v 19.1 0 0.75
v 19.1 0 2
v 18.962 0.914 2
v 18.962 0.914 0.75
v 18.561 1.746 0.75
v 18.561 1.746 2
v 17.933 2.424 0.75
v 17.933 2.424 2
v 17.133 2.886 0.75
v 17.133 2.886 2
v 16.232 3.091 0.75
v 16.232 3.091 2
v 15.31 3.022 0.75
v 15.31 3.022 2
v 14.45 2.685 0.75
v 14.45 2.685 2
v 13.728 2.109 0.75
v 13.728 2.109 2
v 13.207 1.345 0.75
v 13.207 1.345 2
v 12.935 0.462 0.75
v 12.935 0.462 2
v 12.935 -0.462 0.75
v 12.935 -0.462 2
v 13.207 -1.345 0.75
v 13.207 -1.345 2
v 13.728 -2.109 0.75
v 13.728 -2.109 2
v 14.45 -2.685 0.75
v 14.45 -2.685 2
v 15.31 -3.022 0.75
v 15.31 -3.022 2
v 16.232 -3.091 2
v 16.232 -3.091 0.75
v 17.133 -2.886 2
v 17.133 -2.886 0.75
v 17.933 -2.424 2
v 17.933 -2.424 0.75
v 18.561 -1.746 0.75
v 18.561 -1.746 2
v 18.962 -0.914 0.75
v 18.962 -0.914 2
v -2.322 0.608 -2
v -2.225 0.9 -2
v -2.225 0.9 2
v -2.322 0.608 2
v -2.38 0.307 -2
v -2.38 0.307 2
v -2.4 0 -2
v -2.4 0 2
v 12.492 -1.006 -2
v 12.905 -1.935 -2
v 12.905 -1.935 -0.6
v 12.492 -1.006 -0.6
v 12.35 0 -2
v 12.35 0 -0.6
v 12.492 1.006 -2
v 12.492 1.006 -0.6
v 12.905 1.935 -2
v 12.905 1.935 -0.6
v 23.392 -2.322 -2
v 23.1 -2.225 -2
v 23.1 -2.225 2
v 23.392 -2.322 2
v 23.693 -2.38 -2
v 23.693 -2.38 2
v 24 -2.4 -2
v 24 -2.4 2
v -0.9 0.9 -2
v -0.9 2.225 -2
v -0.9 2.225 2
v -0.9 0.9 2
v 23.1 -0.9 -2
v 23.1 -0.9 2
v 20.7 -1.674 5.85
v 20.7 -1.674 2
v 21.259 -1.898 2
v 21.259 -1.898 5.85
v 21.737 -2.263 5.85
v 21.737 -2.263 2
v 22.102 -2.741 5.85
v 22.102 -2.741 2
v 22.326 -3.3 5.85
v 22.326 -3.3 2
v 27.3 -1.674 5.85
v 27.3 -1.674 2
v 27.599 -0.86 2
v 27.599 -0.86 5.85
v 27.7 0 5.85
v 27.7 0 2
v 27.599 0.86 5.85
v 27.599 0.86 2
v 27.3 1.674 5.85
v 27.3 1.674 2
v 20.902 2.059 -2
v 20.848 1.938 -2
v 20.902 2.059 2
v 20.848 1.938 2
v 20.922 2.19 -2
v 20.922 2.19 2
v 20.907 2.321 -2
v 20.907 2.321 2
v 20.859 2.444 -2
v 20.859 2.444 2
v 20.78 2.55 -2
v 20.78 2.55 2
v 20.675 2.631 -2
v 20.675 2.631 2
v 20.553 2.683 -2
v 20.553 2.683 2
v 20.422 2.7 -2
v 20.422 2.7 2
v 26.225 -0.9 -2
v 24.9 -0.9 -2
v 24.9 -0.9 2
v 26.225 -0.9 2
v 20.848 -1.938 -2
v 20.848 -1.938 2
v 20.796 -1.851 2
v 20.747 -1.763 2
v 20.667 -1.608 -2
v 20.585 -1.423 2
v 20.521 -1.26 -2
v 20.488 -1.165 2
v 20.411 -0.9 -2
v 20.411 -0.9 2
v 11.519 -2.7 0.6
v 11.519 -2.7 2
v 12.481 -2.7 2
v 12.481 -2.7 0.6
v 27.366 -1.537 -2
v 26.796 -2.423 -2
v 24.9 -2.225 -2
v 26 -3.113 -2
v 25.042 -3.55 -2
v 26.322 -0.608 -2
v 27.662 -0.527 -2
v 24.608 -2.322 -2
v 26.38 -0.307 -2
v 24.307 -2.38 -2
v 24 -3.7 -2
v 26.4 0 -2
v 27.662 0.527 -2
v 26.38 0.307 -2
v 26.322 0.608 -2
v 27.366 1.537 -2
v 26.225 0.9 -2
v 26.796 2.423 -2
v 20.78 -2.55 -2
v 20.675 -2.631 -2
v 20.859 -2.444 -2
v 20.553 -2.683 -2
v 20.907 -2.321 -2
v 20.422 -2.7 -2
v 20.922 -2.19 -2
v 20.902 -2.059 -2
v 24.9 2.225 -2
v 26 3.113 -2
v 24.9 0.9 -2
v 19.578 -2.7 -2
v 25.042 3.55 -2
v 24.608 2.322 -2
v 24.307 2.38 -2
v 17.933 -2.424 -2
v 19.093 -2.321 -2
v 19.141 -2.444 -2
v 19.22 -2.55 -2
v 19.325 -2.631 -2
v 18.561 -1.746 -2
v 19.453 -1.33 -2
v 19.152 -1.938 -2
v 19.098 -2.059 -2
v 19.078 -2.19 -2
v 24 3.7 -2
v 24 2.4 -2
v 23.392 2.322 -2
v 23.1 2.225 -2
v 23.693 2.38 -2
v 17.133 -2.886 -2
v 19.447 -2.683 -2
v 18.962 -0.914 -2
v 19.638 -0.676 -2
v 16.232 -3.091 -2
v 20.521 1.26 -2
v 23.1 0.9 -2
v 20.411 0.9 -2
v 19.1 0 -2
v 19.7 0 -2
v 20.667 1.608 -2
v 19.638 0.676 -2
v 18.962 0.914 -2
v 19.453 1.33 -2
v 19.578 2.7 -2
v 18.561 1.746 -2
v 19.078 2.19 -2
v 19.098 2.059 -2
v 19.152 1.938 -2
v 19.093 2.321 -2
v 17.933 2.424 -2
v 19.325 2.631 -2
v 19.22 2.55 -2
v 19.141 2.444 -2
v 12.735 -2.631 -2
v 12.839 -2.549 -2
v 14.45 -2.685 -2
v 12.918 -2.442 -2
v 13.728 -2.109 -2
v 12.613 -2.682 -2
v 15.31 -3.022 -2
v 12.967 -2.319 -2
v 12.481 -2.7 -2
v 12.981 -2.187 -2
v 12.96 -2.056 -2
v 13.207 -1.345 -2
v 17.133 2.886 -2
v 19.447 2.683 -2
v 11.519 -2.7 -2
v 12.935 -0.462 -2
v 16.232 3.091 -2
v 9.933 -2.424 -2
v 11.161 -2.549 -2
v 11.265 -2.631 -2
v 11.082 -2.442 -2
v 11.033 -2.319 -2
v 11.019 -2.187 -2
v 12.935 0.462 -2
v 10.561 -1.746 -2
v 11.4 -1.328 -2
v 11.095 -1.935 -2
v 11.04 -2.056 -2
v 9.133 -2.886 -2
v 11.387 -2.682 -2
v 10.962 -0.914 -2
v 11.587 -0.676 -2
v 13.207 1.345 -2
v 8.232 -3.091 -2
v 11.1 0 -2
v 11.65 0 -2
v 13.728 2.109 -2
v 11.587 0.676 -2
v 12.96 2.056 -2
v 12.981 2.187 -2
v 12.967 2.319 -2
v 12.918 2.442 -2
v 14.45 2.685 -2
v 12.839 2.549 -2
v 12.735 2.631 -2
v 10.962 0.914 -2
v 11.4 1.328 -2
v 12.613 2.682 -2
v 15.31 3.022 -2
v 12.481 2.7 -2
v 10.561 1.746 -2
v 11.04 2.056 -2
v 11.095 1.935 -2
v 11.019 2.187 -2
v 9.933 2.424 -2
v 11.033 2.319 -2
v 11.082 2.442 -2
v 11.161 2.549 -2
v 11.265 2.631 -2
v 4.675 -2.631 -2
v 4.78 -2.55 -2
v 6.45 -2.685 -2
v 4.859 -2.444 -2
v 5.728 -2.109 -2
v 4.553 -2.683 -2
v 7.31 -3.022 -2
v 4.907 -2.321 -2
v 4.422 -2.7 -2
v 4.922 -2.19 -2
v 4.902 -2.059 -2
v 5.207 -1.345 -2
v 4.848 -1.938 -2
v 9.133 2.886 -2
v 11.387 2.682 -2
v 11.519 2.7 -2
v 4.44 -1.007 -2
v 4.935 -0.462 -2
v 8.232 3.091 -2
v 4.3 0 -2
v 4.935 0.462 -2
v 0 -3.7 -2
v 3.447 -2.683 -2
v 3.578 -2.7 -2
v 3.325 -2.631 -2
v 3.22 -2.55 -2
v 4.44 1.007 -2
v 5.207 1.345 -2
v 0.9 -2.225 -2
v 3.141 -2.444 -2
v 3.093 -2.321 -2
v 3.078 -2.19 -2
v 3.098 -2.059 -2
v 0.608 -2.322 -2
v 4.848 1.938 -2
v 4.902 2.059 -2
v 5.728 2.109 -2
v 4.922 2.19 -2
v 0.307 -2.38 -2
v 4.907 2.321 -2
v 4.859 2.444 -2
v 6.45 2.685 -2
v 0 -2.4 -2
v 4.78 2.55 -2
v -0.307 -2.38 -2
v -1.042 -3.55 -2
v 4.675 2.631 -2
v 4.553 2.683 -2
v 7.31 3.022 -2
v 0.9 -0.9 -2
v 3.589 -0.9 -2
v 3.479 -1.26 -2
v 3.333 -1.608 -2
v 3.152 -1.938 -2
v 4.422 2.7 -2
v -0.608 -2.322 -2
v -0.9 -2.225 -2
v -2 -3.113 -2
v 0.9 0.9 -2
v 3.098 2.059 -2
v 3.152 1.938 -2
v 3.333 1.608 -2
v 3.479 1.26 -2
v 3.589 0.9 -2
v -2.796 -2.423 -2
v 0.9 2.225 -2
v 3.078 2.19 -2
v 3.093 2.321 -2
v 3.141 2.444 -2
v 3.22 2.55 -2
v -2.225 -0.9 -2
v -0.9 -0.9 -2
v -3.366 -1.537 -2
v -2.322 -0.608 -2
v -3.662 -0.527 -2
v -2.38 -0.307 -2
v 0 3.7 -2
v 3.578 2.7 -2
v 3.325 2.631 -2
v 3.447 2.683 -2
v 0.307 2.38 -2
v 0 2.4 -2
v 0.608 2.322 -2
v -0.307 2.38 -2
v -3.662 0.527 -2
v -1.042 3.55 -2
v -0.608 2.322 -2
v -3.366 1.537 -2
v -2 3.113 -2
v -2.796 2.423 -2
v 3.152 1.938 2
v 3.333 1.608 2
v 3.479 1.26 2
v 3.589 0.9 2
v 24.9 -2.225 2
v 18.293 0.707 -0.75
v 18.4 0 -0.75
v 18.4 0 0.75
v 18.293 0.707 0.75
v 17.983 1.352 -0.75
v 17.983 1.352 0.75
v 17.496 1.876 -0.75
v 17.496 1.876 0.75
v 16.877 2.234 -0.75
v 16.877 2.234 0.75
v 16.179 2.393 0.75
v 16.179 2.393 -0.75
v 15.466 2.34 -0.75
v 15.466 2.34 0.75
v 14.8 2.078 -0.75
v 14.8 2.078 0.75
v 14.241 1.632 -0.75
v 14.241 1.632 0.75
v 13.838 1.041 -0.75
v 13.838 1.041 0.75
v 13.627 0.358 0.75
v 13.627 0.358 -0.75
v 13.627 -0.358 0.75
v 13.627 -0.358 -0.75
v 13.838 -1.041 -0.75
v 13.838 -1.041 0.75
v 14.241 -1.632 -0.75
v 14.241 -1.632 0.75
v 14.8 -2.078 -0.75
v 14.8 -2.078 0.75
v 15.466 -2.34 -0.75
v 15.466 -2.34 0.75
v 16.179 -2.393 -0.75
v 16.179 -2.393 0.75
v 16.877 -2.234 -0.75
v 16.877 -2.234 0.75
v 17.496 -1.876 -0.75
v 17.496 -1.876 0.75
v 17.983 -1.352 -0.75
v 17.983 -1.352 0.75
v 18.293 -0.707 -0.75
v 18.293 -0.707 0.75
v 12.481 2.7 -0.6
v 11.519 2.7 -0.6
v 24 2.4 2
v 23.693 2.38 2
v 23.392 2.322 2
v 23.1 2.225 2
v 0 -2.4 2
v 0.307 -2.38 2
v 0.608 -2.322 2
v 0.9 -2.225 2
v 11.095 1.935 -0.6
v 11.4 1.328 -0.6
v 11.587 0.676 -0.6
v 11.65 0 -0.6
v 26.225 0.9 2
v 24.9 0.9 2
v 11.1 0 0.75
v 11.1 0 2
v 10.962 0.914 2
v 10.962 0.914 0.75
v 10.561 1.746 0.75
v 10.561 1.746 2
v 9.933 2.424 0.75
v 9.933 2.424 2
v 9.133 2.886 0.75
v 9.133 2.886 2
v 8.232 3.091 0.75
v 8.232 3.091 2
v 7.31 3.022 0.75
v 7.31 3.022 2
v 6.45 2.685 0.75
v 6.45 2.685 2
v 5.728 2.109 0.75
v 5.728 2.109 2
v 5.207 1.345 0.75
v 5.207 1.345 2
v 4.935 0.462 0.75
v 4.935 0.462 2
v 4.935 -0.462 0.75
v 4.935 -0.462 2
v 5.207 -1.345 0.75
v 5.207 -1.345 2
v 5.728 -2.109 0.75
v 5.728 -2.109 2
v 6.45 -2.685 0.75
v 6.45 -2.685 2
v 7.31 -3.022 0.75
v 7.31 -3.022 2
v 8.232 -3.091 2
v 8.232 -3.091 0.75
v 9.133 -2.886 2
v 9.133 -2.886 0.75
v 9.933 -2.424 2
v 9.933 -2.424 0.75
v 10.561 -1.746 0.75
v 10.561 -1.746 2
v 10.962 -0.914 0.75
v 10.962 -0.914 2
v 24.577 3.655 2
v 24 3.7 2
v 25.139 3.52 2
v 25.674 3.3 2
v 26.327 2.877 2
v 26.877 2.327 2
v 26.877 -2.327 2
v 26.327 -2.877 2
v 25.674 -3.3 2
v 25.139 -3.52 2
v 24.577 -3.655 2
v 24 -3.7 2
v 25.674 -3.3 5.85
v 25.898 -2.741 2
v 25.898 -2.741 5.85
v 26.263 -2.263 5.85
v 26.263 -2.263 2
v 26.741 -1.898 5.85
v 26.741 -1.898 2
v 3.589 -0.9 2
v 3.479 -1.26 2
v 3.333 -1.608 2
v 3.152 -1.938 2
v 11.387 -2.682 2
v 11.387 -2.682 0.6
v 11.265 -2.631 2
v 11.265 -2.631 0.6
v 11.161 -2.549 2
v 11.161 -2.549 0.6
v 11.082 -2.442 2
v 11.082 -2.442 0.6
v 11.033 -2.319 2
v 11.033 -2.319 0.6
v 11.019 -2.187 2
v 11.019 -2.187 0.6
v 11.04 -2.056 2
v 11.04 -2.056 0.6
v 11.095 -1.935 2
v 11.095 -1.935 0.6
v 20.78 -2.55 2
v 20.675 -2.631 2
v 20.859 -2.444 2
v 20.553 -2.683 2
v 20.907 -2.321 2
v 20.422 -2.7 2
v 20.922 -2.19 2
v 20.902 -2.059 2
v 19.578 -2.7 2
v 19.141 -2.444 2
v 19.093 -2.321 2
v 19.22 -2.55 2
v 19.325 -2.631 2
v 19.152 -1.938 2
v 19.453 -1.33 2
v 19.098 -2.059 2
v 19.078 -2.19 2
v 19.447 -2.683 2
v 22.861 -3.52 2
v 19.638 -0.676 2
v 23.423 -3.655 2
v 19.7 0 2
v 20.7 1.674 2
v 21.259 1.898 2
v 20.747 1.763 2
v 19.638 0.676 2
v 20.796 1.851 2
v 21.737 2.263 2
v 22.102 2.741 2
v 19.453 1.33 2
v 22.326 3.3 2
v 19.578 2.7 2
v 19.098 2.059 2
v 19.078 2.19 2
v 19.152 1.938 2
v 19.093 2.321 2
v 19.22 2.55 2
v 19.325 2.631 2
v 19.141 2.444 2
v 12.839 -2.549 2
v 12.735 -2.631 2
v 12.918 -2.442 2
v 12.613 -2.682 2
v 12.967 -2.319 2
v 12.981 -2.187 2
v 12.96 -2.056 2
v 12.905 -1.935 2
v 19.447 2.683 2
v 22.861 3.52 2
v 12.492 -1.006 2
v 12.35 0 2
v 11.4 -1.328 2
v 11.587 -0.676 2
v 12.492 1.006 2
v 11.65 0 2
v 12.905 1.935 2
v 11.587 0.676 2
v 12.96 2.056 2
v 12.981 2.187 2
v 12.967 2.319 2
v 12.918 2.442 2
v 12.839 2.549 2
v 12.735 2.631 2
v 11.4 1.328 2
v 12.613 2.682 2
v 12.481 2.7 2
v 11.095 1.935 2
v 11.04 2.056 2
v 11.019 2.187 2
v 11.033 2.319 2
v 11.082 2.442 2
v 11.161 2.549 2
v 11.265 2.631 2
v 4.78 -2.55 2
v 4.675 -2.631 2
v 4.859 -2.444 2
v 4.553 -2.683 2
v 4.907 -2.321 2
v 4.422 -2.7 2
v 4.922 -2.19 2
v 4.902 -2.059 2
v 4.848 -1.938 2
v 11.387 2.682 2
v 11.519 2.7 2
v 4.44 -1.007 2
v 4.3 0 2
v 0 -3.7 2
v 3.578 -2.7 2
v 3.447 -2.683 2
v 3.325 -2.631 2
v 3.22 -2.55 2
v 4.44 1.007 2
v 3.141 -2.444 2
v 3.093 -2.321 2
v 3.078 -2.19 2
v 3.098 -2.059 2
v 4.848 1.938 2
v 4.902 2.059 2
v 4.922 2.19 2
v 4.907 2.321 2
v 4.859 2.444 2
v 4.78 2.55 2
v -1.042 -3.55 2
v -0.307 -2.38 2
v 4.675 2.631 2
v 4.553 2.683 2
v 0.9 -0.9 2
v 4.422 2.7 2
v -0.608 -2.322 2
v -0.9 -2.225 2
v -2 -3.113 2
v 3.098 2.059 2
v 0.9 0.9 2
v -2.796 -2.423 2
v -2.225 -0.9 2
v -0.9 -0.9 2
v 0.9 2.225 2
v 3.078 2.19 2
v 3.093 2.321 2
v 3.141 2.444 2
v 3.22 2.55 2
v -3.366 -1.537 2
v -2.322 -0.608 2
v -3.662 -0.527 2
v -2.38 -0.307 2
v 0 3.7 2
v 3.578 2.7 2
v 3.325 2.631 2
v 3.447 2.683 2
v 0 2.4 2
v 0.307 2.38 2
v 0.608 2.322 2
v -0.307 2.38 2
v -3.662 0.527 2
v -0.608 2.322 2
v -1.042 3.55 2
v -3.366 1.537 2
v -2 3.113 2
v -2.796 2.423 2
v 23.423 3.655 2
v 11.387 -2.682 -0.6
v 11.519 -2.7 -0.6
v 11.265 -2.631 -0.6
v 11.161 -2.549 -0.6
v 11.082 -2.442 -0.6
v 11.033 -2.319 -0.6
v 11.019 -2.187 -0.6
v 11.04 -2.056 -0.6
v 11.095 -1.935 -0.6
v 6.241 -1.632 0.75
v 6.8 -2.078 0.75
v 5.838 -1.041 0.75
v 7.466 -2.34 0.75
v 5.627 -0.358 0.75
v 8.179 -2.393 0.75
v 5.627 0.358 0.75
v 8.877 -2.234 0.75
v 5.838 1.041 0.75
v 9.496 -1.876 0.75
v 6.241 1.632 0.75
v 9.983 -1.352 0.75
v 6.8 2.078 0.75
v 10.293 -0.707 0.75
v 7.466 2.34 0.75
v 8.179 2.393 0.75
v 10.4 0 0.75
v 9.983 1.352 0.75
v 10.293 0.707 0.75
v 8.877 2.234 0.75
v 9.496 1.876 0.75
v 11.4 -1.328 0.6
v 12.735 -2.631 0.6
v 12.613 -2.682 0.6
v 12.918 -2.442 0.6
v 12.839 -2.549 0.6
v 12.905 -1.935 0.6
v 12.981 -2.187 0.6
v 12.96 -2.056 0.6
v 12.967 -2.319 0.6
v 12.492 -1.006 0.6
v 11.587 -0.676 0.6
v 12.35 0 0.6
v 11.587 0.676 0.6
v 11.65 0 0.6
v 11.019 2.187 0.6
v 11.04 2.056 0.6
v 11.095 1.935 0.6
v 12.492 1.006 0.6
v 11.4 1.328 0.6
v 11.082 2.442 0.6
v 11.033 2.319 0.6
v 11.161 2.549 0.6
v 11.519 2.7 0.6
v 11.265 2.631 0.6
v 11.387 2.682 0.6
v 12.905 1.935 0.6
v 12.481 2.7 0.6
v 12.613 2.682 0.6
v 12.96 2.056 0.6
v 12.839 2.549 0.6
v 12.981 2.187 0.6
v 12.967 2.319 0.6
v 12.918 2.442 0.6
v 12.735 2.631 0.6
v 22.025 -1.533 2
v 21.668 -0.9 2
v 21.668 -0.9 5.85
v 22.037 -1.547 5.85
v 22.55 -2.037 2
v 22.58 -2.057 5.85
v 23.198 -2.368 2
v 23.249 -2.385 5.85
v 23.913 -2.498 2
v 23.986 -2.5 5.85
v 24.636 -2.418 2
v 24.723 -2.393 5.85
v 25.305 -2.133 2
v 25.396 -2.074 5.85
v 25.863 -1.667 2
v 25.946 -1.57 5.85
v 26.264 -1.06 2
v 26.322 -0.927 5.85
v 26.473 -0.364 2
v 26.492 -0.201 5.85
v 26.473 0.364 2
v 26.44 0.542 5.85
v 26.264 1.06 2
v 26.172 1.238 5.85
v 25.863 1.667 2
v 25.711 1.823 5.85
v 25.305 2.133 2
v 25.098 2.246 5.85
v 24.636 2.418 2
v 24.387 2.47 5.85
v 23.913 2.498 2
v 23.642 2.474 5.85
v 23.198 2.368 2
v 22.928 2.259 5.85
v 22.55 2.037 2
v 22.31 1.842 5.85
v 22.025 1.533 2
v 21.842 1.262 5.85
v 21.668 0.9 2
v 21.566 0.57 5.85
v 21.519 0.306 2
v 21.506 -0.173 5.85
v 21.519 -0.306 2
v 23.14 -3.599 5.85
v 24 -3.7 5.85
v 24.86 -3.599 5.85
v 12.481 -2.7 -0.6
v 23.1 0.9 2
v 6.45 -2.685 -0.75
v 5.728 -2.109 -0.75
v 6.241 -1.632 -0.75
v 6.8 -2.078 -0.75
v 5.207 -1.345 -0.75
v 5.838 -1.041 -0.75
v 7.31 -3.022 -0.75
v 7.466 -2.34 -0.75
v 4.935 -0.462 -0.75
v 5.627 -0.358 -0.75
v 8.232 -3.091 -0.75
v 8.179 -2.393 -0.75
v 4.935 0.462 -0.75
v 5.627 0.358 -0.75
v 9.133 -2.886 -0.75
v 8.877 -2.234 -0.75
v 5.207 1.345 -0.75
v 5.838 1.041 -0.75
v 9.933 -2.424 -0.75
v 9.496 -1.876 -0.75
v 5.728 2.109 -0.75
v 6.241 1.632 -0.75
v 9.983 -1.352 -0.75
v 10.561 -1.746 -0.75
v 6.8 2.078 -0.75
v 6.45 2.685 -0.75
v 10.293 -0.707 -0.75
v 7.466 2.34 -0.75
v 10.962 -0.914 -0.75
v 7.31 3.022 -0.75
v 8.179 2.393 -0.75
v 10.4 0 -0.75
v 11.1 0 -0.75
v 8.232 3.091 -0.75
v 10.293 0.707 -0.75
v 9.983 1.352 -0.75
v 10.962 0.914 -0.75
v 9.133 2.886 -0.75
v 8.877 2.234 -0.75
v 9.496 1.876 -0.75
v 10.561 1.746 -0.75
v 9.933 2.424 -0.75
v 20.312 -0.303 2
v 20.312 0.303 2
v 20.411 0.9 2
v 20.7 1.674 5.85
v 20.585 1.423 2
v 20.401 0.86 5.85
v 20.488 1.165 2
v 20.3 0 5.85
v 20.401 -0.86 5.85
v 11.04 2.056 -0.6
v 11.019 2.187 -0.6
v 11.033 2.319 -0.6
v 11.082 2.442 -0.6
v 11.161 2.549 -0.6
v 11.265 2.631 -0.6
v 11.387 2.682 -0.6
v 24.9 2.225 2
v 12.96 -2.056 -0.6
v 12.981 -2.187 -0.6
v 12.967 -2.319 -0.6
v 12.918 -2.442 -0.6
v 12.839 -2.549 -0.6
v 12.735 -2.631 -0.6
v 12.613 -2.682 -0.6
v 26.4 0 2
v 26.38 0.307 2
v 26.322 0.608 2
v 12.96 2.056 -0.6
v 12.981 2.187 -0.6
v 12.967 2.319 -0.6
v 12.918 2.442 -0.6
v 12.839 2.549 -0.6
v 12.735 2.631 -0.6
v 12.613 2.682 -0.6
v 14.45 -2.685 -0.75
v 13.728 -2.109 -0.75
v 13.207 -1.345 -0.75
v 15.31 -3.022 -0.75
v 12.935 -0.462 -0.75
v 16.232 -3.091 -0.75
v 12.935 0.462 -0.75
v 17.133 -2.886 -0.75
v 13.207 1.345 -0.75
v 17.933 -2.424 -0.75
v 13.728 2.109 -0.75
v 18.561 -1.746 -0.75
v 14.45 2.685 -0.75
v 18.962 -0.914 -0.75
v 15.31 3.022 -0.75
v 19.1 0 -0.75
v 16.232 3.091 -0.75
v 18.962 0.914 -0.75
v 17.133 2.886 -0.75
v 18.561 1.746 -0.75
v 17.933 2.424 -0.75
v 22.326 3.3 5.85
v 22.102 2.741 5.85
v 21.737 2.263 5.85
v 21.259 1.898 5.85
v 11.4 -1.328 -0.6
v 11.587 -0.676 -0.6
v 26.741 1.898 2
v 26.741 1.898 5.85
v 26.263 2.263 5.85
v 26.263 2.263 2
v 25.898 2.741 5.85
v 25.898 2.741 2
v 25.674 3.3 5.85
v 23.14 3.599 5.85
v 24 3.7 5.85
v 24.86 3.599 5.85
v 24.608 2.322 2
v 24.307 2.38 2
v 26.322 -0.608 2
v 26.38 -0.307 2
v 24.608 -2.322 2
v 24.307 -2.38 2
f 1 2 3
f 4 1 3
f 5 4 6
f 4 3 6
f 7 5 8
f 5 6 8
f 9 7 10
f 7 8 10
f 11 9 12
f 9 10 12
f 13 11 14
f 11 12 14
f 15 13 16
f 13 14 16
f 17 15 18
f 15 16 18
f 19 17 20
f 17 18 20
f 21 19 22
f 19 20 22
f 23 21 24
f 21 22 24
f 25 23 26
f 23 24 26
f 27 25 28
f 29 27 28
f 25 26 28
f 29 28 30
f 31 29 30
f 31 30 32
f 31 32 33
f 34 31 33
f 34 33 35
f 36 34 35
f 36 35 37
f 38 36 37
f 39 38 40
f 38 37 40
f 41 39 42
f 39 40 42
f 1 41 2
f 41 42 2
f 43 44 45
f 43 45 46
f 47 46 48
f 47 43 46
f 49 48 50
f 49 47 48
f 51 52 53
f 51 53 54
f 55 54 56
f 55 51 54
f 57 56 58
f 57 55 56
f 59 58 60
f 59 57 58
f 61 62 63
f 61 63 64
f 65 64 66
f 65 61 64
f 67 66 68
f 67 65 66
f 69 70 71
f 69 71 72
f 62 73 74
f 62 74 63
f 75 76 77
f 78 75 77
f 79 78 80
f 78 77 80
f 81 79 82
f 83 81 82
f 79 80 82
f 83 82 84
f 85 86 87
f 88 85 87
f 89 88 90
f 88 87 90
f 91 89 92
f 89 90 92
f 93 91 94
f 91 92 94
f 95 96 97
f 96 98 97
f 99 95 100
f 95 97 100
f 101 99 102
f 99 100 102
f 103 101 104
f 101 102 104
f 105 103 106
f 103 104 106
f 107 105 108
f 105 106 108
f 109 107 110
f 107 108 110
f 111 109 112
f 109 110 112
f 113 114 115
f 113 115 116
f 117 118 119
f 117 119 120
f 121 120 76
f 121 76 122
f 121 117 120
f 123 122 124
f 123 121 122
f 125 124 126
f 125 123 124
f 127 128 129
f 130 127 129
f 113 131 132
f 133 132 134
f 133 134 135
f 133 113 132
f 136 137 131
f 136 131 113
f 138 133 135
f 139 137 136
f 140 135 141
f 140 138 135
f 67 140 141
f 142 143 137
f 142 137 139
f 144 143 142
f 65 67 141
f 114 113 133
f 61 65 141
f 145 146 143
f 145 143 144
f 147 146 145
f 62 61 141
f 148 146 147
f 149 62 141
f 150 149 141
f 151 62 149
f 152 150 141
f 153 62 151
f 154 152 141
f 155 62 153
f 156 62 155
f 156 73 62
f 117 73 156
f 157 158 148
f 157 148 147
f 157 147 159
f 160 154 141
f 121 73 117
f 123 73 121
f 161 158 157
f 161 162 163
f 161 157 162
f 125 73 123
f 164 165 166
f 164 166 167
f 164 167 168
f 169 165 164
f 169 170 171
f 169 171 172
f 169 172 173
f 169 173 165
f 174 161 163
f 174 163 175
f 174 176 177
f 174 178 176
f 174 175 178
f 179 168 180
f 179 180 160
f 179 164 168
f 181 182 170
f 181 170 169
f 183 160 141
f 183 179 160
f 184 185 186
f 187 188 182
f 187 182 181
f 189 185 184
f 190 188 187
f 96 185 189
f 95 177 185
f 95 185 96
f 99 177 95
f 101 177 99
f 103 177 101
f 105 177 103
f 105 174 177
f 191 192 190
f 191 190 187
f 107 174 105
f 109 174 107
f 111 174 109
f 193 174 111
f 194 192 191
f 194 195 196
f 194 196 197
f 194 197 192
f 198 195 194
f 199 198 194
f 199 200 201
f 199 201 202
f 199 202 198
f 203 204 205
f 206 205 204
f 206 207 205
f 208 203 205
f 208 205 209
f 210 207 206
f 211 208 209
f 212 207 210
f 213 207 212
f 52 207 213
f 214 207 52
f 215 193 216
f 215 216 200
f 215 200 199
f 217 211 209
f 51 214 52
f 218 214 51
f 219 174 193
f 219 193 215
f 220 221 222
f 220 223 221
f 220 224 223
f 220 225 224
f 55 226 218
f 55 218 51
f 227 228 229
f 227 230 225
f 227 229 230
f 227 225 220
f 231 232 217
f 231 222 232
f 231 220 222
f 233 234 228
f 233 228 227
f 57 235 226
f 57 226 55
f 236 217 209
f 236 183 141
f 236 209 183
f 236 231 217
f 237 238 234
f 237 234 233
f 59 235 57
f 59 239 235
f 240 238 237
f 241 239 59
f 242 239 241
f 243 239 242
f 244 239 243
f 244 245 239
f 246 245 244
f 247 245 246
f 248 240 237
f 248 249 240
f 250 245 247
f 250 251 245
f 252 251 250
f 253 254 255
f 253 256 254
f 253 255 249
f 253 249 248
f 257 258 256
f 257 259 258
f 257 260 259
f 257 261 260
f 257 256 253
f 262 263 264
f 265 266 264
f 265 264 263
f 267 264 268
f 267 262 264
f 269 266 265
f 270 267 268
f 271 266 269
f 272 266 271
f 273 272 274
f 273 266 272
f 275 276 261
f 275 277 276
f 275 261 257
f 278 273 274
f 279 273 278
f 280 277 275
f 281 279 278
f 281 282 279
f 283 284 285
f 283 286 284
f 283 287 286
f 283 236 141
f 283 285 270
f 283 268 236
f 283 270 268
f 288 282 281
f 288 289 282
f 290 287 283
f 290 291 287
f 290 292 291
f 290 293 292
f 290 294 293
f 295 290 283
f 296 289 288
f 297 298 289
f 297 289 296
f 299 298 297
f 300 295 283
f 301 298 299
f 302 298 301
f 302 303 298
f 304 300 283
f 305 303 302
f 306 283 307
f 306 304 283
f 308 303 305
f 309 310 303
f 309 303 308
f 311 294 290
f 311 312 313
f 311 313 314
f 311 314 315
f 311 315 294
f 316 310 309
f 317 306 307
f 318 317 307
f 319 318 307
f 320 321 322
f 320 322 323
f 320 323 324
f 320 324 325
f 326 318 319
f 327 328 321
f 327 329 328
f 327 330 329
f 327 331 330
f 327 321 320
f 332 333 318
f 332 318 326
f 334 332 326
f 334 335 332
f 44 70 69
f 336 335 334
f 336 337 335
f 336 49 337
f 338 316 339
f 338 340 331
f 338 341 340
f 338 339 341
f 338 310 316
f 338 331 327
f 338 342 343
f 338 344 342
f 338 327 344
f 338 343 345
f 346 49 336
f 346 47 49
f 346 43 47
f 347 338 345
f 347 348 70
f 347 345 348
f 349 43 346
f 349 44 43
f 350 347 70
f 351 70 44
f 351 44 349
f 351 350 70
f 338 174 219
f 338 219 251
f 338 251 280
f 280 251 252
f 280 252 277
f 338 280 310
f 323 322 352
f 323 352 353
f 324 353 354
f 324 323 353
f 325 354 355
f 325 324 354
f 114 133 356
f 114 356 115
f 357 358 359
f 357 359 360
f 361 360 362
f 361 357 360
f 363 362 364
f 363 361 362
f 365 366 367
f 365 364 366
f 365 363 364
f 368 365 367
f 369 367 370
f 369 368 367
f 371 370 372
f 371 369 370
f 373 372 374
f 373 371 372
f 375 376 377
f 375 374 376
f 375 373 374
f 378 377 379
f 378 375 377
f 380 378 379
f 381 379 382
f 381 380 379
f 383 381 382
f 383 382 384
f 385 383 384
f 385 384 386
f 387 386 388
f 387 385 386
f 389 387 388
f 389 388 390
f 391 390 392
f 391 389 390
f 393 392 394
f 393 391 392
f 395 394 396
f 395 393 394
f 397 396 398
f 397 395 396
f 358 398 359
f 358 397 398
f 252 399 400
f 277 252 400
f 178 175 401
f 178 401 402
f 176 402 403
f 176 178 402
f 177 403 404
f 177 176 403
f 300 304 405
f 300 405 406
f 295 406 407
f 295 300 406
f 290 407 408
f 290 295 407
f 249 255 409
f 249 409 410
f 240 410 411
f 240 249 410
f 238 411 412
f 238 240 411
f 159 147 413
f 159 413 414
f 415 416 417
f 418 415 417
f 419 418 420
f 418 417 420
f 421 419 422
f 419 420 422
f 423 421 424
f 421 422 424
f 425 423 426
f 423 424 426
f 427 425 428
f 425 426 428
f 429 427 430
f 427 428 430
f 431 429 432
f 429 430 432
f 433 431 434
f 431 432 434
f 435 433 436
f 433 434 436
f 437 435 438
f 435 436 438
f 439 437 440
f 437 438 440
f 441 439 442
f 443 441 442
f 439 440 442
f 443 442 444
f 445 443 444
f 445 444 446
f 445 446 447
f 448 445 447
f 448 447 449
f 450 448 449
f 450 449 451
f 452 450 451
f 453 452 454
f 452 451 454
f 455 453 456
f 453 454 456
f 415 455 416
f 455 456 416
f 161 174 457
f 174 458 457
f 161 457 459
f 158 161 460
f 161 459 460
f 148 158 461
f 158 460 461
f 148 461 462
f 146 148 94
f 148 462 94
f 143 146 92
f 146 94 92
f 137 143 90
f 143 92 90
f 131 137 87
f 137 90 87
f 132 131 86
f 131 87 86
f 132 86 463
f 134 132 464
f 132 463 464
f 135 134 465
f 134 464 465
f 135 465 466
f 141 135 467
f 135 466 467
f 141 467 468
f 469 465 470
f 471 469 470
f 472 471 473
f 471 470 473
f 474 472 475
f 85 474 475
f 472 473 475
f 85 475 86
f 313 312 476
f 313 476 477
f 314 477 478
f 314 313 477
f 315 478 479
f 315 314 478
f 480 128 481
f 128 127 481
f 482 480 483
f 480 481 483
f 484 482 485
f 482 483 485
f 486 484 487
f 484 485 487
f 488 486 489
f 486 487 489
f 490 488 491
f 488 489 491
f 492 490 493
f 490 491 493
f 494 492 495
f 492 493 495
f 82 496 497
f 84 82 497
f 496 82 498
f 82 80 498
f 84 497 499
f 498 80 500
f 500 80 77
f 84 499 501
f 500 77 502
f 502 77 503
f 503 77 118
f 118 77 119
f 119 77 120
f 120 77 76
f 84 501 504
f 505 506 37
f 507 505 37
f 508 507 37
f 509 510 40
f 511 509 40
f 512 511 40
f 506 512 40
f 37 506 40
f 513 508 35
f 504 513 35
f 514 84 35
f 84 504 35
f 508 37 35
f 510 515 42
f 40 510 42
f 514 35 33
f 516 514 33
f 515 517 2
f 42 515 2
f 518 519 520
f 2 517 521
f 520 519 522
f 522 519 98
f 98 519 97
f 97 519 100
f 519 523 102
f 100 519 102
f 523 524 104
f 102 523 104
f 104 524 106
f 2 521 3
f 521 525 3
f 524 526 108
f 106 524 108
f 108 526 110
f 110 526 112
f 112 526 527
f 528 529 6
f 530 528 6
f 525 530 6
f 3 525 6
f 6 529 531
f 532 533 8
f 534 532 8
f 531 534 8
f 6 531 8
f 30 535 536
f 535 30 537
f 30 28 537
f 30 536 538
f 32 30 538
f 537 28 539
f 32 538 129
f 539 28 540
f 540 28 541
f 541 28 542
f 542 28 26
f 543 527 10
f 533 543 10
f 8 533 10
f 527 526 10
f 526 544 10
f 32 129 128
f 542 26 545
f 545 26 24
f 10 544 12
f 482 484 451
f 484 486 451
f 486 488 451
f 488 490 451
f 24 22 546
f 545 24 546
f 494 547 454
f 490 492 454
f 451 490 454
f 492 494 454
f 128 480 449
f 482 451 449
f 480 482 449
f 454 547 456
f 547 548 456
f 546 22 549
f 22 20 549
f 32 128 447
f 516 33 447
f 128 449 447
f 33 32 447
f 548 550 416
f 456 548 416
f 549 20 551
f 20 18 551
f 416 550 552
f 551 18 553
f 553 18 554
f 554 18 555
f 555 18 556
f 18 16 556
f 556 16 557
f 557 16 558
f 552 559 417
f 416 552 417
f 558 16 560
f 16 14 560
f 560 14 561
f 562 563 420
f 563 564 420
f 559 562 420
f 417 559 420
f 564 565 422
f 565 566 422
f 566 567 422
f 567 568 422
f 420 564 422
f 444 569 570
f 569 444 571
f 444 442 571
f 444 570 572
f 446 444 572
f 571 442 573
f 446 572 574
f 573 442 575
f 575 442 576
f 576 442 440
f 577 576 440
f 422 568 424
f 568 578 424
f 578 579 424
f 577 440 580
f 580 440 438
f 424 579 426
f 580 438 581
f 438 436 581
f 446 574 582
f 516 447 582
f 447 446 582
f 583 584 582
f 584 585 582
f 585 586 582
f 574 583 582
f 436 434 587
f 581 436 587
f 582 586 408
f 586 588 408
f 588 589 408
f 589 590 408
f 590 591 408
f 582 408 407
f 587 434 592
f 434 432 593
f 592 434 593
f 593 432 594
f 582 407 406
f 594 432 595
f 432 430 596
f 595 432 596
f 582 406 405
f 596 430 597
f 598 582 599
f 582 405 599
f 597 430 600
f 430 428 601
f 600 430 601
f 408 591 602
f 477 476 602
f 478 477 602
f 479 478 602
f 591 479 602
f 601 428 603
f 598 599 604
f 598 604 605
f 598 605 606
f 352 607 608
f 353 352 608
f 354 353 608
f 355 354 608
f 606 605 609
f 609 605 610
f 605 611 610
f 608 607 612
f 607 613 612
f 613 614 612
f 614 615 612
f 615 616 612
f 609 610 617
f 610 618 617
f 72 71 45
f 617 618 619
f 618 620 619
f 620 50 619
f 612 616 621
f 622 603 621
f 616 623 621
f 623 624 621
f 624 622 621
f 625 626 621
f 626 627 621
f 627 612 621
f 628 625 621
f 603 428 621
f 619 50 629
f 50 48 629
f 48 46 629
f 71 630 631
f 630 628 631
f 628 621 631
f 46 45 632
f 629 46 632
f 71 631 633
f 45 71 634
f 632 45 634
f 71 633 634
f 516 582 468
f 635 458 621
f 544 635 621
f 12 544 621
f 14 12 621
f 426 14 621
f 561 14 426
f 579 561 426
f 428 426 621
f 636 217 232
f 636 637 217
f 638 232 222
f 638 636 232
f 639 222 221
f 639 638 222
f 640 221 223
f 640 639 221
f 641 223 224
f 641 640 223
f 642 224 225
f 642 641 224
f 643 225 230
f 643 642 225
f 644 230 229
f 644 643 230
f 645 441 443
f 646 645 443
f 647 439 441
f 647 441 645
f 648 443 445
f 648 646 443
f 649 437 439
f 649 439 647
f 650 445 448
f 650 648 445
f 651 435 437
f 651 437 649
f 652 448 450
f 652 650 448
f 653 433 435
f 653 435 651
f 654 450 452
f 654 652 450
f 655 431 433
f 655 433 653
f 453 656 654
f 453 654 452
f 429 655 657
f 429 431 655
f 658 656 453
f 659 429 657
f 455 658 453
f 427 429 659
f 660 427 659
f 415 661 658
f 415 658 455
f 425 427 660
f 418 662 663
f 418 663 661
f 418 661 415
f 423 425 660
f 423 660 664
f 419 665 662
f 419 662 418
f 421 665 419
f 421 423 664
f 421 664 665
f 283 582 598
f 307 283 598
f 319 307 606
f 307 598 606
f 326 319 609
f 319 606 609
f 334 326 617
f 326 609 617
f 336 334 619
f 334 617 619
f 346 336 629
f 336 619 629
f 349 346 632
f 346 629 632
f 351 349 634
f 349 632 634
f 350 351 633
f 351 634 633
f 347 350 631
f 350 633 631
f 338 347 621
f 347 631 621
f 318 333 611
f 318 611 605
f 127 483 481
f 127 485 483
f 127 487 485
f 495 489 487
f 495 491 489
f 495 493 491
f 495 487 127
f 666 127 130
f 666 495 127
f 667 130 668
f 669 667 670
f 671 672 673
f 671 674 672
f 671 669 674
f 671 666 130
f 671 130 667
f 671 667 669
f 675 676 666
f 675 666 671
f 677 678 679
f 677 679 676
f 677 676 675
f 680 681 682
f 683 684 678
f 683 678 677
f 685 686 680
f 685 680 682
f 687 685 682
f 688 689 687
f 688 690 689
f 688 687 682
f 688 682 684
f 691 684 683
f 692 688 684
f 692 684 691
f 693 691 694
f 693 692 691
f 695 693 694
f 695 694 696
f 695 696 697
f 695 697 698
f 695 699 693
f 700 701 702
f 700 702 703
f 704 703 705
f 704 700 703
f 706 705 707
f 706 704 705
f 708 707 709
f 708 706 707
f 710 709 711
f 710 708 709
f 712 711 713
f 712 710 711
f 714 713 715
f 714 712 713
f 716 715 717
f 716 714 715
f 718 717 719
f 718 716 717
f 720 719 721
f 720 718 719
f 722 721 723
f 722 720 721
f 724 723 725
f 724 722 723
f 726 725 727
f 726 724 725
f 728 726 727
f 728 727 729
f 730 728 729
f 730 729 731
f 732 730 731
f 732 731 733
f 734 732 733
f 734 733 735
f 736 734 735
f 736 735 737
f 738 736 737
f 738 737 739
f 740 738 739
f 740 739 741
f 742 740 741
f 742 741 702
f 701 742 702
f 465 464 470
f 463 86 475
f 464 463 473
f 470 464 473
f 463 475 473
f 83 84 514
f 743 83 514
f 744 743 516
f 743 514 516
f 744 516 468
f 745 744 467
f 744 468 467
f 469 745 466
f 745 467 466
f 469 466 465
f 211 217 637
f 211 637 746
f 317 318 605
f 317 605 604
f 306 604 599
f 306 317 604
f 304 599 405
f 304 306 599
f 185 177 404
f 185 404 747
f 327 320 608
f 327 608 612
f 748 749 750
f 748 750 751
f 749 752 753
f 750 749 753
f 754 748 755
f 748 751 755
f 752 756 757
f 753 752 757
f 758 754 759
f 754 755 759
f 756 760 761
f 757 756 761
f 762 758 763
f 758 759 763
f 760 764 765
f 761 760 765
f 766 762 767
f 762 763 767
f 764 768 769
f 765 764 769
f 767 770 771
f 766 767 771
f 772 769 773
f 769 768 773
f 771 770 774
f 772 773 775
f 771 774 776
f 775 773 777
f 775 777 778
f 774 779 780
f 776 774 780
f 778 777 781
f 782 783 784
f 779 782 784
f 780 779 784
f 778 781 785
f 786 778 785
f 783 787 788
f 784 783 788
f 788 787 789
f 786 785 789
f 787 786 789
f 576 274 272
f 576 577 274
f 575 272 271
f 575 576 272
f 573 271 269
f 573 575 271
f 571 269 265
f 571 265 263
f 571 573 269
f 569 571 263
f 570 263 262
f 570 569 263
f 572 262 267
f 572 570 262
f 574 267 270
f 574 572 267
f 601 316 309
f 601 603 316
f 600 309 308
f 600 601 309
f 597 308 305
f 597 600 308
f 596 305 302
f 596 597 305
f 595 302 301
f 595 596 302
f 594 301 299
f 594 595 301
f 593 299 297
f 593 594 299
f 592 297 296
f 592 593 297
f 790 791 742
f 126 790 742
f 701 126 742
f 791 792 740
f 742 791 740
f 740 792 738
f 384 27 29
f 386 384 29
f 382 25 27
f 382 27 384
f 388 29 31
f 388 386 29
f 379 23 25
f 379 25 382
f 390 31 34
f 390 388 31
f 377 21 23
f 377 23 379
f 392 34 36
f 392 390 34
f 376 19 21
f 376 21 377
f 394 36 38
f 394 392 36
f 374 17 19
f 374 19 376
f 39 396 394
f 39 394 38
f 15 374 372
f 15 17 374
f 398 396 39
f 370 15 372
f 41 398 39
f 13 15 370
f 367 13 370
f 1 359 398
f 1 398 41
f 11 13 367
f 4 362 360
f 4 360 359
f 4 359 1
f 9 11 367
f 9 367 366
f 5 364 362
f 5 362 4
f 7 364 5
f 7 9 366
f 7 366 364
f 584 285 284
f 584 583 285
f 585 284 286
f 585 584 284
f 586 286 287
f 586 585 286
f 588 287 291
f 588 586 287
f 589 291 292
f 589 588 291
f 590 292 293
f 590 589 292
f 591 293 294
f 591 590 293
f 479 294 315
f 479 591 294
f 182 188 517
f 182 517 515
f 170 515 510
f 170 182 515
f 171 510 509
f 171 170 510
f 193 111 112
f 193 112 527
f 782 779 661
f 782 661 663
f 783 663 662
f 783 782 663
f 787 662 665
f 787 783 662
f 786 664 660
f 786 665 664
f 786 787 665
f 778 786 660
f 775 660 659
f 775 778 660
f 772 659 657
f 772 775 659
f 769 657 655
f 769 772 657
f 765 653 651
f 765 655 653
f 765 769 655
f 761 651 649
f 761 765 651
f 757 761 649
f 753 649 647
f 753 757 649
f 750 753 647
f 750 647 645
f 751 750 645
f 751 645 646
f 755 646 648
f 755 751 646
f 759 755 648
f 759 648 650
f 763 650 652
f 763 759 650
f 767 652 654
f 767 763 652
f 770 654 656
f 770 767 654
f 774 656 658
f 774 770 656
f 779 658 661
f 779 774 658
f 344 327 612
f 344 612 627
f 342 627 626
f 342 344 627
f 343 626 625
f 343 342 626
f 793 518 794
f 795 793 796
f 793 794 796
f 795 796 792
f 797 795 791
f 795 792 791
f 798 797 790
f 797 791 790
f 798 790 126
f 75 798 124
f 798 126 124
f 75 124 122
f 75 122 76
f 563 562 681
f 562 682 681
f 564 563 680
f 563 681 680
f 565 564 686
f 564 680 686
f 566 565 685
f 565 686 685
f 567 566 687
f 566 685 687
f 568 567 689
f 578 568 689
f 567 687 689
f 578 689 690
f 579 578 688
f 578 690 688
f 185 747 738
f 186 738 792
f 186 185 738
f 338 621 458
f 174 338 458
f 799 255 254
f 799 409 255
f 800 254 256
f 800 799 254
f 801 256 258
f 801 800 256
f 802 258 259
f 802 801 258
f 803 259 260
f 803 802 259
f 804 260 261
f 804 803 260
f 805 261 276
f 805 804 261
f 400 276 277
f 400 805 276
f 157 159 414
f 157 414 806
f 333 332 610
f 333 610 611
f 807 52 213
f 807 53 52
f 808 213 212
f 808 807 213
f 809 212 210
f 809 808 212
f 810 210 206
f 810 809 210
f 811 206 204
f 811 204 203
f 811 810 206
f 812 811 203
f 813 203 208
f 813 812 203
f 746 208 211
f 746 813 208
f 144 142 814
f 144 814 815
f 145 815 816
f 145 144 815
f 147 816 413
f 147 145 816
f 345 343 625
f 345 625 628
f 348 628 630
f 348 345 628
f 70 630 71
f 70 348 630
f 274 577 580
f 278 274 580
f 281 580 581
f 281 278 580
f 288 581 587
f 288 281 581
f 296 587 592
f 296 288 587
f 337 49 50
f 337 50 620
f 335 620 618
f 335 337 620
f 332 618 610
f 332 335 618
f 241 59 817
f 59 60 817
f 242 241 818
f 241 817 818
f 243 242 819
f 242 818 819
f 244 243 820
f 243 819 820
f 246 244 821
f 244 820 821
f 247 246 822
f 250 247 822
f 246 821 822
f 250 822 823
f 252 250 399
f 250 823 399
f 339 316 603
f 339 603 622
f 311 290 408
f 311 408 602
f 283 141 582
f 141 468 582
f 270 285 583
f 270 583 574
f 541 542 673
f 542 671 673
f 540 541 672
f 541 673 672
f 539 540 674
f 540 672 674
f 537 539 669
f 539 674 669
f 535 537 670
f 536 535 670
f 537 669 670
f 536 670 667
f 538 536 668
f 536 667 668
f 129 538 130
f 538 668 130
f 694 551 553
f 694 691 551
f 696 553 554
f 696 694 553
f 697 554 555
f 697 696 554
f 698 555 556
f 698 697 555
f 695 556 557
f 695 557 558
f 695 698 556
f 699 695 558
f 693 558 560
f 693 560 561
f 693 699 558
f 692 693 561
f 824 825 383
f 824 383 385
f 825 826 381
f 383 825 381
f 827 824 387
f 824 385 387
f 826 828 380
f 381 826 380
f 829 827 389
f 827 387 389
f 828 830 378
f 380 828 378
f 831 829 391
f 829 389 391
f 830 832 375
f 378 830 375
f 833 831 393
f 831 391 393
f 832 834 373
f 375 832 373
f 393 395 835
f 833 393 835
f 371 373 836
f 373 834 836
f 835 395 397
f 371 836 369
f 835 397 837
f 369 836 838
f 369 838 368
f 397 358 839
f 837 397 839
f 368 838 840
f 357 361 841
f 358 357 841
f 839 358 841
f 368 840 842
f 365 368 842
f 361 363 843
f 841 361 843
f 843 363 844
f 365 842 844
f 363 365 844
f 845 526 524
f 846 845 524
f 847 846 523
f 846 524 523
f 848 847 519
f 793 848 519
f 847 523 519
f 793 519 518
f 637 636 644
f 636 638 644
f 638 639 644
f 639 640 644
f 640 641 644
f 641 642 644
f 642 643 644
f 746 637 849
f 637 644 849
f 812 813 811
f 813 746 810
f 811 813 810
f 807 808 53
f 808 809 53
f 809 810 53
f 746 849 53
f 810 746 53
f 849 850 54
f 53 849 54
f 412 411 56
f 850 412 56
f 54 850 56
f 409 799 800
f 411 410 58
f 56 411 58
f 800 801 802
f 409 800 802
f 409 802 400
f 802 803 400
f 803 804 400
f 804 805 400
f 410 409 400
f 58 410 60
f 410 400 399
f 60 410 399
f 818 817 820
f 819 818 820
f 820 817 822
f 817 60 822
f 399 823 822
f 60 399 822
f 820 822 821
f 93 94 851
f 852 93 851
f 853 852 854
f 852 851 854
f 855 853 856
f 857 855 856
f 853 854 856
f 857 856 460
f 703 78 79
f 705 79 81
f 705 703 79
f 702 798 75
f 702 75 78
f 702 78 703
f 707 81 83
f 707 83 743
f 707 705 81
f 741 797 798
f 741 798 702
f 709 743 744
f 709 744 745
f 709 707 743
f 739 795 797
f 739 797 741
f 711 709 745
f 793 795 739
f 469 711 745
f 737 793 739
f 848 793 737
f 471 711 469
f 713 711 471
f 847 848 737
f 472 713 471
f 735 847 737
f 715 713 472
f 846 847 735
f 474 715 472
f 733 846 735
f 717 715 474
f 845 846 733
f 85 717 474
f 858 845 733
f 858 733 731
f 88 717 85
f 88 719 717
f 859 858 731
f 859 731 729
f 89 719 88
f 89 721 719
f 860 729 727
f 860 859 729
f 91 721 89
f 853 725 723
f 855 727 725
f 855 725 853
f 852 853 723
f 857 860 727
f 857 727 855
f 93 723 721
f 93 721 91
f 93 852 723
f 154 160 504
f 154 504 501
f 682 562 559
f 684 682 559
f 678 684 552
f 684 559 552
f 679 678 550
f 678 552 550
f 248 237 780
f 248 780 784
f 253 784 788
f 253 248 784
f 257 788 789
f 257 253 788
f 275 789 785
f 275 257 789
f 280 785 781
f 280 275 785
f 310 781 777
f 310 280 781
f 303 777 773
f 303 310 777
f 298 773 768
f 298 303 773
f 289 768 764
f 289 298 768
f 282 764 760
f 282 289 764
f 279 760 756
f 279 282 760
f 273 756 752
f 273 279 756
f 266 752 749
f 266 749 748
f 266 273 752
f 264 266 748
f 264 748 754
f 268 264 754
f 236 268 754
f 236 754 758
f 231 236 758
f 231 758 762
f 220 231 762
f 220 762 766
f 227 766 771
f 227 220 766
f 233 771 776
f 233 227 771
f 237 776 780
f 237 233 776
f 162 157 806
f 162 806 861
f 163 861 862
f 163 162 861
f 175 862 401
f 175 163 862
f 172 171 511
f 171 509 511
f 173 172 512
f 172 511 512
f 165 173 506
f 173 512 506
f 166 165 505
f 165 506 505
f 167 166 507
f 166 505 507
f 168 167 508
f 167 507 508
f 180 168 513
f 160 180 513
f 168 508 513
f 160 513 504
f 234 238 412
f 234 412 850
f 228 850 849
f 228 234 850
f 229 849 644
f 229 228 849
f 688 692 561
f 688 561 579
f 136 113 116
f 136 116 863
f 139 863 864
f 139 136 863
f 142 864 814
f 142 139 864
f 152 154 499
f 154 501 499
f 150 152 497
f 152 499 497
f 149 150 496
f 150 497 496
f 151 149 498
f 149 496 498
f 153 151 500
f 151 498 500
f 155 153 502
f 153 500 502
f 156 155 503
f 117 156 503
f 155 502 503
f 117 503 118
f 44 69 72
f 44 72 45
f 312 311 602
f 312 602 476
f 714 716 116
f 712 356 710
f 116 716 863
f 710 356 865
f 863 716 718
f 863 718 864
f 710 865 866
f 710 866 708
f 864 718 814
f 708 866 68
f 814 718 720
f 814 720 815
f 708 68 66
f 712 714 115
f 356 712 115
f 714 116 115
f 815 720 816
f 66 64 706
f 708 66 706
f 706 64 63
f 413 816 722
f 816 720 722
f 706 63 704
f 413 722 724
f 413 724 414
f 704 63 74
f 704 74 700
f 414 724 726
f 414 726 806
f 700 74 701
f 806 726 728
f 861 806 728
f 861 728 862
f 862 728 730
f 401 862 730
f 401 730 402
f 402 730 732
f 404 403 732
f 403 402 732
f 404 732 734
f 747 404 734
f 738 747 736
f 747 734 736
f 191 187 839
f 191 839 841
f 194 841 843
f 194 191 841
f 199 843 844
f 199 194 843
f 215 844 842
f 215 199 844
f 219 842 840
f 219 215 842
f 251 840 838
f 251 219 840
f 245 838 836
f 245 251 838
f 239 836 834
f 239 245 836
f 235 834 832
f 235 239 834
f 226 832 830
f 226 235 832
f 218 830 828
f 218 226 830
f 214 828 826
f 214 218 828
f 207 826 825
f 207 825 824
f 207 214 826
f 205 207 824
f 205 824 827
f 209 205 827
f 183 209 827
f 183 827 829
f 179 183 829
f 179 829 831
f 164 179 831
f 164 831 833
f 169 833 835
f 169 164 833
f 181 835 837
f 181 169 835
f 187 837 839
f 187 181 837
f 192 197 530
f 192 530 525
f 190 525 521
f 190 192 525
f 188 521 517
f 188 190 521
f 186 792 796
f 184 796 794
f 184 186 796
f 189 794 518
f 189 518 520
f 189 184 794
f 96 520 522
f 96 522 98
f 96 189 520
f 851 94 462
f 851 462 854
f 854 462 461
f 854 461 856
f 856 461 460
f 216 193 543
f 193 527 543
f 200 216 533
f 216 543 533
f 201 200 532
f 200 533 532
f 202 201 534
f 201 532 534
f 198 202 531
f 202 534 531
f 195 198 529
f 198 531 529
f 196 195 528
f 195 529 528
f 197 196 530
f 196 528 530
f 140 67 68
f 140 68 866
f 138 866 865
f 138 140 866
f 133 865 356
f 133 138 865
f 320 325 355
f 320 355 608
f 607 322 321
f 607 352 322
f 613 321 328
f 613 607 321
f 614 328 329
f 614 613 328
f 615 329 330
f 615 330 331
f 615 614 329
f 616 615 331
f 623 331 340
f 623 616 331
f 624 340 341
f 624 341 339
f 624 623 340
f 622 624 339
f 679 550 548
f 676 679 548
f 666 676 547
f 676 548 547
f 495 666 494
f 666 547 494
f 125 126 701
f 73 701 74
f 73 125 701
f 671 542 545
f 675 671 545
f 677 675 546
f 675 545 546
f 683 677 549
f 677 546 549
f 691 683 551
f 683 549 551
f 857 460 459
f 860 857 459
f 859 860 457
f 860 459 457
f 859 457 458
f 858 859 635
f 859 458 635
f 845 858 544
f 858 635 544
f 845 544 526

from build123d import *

# Parameters (mm, degrees)
SKETCH1_R            = 2.4
BEAM_DEPTH           = 2
AXLE_CUT_DEPTH       = 29.017494535
AXLE_CUT_DEPTH_BACK  = 29.017494535
SKETCH3_R            = 3.1
HOLE_SURROUND_DEPTH  = 1.25
CAVITY_CUT_DEPTH     = 1.4
FILLET2_R            = 0.5
FILLET2_OF_MIRROR2_R = 0.5
FILLET3_R            = 0.5
SKETCH5_R            = 2.5
EXTENSION_DEPTH      = 3.85


with BuildPart() as part:
    # Sketch1 → Beam (new, symmetric)
    with BuildSketch(Plane.XY):
        with BuildLine():
            Line((24, 3.7), (0, 3.7))
            ThreePointArc((0, 3.7), (-3.7, 0), (0, -3.7))
            Line((0, -3.7), (24, -3.7))
            ThreePointArc((24, -3.7), (27.7, 0), (24, 3.7))
        make_face()
        with Locations((8, 0)):
            Circle(SKETCH1_R, mode=Mode.SUBTRACT)
        with Locations((16, 0)):
            Circle(SKETCH1_R, mode=Mode.SUBTRACT)
    extrude(amount=BEAM_DEPTH, both=True)

    # Sketch2 → Axle Cut (cut, two sides: drawn at the far end of the back side and taken through both)
    with BuildSketch(Plane.XY.offset(-AXLE_CUT_DEPTH_BACK)):
        with BuildLine():
            ThreePointArc((-0.9, -2.224859546), (0, -2.4), (0.9, -2.224859546))
            Line((0.9, -2.224859546), (0.9, -0.9))
            Line((0.9, -0.9), (3.588871689, -0.9))
            ThreePointArc((3.588871689, -0.9), (3.188981578, -1.876271967), (2.529822128, -2.7))
            Line((2.529822128, -2.7), (5.470177872, -2.7))
            ThreePointArc((5.470177872, -2.7), (4.3, 0), (5.470177872, 2.7))
            Line((5.470177872, 2.7), (2.529822128, 2.7))
            ThreePointArc((2.529822128, 2.7), (3.188981578, 1.876271967), (3.588871689, 0.9))
            Line((3.588871689, 0.9), (0.9, 0.9))
            Line((0.9, 0.9), (0.9, 2.224859546))
            ThreePointArc((0.9, 2.224859546), (0, 2.4), (-0.9, 2.224859546))
            Line((-0.9, 2.224859546), (-0.9, 0.9))
            Line((-0.9, 0.9), (-2.224859546, 0.9))
            ThreePointArc((-2.224859546, 0.9), (-2.4, 0), (-2.224859546, -0.9))
            Line((-2.224859546, -0.9), (-0.9, -0.9))
            Line((-0.9, -0.9), (-0.9, -2.224859546))
        make_face()
        with BuildLine():
            Line((18.529822128, -2.7), (21.470177872, -2.7))
            ThreePointArc((21.470177872, -2.7), (20.811018422, -1.876271967), (20.411128311, -0.9))
            Line((20.411128311, -0.9), (23.1, -0.9))
            Line((23.1, -0.9), (23.1, -2.224859546))
            ThreePointArc((23.1, -2.224859546), (24, -2.4), (24.9, -2.224859546))
            Line((24.9, -2.224859546), (24.9, -0.9))
            Line((24.9, -0.9), (26.224859546, -0.9))
            ThreePointArc((26.224859546, -0.9), (26.4, 0), (26.224859546, 0.9))
            Line((26.224859546, 0.9), (24.9, 0.9))
            Line((24.9, 0.9), (24.9, 2.224859546))
            ThreePointArc((24.9, 2.224859546), (24, 2.4), (23.1, 2.224859546))
            Line((23.1, 2.224859546), (23.1, 0.9))
            Line((23.1, 0.9), (20.411128311, 0.9))
            ThreePointArc((20.411128311, 0.9), (20.811018422, 1.876271967), (21.470177872, 2.7))
            Line((21.470177872, 2.7), (18.529822128, 2.7))
            ThreePointArc((18.529822128, 2.7), (19.7, 0), (18.529822128, -2.7))
        make_face()
    extrude(amount=AXLE_CUT_DEPTH + AXLE_CUT_DEPTH_BACK, mode=Mode.SUBTRACT)

    # Sketch3 → Hole Surround (cut)
    with BuildSketch(Plane.XY.offset(2)):
        with Locations((16, 0)):
            Circle(SKETCH3_R)
        with Locations((8, 0)):
            Circle(SKETCH3_R)
    hole_surround = extrude(amount=-HOLE_SURROUND_DEPTH, mode=Mode.SUBTRACT)

    # Sketch4 → Cavity Cut (cut)
    with BuildSketch(Plane.XY.offset(2)):
        with BuildLine():
            Line((13.543885182, 2.7), (10.456114818, 2.7))
            ThreePointArc((10.456114818, 2.7), (11.338212028, 1.476089583), (11.65, 0))
            ThreePointArc((11.65, 0), (11.338212028, -1.476089583), (10.456114818, -2.7))
            Line((10.456114818, -2.7), (13.543885182, -2.7))
            ThreePointArc((13.543885182, -2.7), (12.35, 0), (13.543885182, 2.7))
        make_face()
    cavity_cut = extrude(amount=-CAVITY_CUT_DEPTH, mode=Mode.SUBTRACT)

    # Fillet2
    fillet2_edges = [part.edges().sort_by_distance(p)[0] for p in [
        (13.543885182, 2.7, 1.3),
        (13.543885182, -2.7, 1.3),
        (10.456114818, 2.7, 1.3),
        (10.456114818, -2.7, 1.3),
    ]]
    fillet(fillet2_edges, radius=FILLET2_R)

    # Mirror2: Hole Surround, Cavity Cut across plane
    add(hole_surround.mirror(Plane.XY), mode=Mode.SUBTRACT)
    add(cavity_cut.mirror(Plane.XY), mode=Mode.SUBTRACT)

    # Fillet2 of Mirror2
    fillet2_of_mirror2_edges = [part.edges().sort_by_distance(p)[0] for p in [
        (13.543885182, 2.7, -1.3),
        (13.543885182, -2.7, -1.3),
        (10.456114818, 2.7, -1.3),
        (10.456114818, -2.7, -1.3),
    ]]
    fillet(fillet2_of_mirror2_edges, radius=FILLET2_OF_MIRROR2_R)

    # Fillet3
    fillet3_edges = [part.edges().sort_by_distance(p)[0] for p in [
        (2.529822128, -2.7, 0),
        (5.470177872, -2.7, 0),
        (5.470177872, 2.7, 0),
        (2.529822128, 2.7, 0),
        (21.470177872, 2.7, 0),
        (21.470177872, -2.7, 0),
        (18.529822128, -2.7, 0),
        (18.529822128, 2.7, 0),
    ]]
    fillet(fillet3_edges, radius=FILLET3_R)

    # Sketch5 → Extension (add)
    with BuildSketch(Plane.XY.offset(2)):
        with BuildLine():
            ThreePointArc((27.299887499, -1.673541902), (27.7, 0), (27.299887499, 1.673541902))
            ThreePointArc((27.299887499, 1.673541902), (26.2627417, 2.2627417), (25.673541902, 3.299887499))
            ThreePointArc((25.673541902, 3.299887499), (24, 3.7), (22.326458098, 3.299887499))
            ThreePointArc((22.326458098, 3.299887499), (21.7372583, 2.2627417), (20.700112501, 1.673541902))
            ThreePointArc((20.700112501, 1.673541902), (20.3, 0), (20.700112501, -1.673541902))
            ThreePointArc((20.700112501, -1.673541902), (21.7372583, -2.2627417), (22.326458098, -3.299887499))
            ThreePointArc((22.326458098, -3.299887499), (24, -3.7), (25.673541902, -3.299887499))
            ThreePointArc((25.673541902, -3.299887499), (26.2627417, -2.2627417), (27.299887499, -1.673541902))
        make_face()
        with Locations((24, 0)):
            Circle(SKETCH5_R, mode=Mode.SUBTRACT)
    extrude(amount=EXTENSION_DEPTH)


solid = part.part
